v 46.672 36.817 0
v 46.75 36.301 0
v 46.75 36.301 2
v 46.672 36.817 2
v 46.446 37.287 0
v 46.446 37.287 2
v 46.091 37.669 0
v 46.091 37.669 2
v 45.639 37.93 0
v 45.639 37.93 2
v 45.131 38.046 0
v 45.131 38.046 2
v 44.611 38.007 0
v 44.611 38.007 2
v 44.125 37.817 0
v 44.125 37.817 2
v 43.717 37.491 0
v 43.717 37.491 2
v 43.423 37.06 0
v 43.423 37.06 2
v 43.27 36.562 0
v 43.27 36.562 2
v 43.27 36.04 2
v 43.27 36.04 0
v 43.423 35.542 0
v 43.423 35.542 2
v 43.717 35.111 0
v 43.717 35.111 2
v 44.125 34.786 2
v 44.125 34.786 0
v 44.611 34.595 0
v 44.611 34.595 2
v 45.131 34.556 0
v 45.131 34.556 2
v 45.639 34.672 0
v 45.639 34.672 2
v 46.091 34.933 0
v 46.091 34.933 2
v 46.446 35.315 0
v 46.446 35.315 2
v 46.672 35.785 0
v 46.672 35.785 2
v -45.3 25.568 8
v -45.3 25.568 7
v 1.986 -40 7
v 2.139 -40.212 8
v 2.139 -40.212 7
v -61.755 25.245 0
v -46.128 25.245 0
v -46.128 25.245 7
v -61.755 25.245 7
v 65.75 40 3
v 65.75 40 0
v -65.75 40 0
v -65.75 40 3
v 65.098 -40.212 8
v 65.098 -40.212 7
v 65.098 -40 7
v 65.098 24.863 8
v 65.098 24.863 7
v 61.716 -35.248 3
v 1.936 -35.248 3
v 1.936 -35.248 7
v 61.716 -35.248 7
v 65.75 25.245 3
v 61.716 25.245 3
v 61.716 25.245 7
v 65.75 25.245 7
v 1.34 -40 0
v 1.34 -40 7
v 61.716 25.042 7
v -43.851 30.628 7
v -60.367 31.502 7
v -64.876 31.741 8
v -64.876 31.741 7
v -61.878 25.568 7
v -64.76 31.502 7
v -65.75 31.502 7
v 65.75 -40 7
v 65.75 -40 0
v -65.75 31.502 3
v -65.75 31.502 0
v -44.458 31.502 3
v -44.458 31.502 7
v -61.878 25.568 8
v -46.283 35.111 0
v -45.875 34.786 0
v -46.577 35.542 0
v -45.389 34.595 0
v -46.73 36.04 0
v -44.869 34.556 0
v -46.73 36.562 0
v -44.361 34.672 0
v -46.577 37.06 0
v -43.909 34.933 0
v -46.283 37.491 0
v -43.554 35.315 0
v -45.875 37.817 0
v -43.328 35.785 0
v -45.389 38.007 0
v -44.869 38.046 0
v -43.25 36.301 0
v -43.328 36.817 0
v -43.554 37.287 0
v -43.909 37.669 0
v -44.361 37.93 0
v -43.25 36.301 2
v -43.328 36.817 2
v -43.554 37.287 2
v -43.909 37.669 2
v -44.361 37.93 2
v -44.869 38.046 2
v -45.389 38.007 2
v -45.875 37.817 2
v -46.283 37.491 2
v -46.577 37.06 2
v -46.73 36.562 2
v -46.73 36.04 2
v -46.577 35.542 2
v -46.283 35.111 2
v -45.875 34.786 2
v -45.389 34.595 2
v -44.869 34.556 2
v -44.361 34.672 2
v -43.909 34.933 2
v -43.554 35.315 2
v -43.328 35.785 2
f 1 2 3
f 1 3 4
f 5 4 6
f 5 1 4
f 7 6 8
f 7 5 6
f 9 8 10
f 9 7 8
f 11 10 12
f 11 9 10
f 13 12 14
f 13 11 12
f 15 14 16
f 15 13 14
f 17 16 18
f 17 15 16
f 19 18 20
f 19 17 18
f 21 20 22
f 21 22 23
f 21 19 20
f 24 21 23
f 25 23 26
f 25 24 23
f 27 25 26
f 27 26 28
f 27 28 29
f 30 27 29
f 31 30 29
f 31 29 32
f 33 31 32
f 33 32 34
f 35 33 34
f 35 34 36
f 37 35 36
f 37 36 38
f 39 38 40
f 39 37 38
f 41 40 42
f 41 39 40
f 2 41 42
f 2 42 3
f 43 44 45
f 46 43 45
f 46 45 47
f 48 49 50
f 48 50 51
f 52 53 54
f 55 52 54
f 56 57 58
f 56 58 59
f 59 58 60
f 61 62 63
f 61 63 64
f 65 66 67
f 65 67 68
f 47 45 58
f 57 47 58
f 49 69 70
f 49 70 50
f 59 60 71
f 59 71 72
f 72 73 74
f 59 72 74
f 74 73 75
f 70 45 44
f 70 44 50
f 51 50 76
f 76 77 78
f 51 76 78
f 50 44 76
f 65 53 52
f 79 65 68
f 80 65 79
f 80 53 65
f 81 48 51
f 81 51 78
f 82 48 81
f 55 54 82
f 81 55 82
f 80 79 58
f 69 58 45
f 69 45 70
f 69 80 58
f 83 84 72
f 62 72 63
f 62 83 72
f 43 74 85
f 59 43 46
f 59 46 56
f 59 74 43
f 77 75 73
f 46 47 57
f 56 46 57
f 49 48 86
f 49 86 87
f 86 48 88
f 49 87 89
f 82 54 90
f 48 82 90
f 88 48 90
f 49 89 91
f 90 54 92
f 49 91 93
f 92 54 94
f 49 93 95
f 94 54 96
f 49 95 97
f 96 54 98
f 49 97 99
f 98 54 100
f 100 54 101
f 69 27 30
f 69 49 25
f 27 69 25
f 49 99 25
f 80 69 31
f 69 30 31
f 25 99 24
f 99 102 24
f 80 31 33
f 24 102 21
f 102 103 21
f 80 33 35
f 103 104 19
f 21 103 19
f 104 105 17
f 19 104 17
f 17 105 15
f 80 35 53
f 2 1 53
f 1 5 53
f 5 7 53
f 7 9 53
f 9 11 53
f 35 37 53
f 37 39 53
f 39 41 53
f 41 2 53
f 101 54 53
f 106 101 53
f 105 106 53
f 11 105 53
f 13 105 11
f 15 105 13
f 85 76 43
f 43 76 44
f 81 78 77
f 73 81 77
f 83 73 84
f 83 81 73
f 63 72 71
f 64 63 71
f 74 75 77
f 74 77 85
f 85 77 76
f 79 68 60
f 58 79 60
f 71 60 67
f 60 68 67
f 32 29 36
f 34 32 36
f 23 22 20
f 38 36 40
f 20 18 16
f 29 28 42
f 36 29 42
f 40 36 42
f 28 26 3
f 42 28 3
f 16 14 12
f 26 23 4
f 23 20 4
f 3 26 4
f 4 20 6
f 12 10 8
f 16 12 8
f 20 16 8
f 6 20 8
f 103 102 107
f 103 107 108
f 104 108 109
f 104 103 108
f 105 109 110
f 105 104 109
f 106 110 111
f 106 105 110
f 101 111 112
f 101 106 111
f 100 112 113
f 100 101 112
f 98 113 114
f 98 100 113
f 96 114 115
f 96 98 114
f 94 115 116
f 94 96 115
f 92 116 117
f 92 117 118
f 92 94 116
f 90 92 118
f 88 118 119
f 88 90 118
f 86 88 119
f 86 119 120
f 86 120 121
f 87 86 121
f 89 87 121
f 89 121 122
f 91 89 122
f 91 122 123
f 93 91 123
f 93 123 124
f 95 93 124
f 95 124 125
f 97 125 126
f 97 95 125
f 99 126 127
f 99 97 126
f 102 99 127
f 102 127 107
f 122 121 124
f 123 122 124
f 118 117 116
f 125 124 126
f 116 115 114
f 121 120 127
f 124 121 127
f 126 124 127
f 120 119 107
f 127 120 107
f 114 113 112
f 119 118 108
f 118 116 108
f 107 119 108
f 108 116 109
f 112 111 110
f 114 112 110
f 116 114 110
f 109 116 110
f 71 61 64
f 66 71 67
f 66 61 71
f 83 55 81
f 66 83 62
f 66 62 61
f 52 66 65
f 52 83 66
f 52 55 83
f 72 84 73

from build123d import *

# Parameters (mm, degrees)
PAD_DEPTH    = 3
SKETCH_R     = 1.75
POCKET_DEPTH = 2
PAD001_DEPTH = 4
PAD002_DEPTH = 1


with BuildPart() as part:
    # Sketch010 → Pad (new body)
    with BuildSketch(Plane.XY):
        Polygon((-46.128487, 25.244961), (1.34, -40), (65.75, -40), (65.75, 40), (-65.75, 40), (-65.75, 31.502308), (-61.754631, 25.244961), align=None)
    extrude(amount=PAD_DEPTH)

    # Sketch → Pocket (cut)
    with BuildSketch(Plane.XY):
        with Locations((-45, 36.301168)):
            Circle(SKETCH_R)
        with Locations((45, 36.301168)):
            Circle(SKETCH_R)
    extrude(amount=POCKET_DEPTH, mode=Mode.SUBTRACT)

    # Sketch011 (on Face5 of Pocket) → Pad001 (join)
    with BuildSketch(Plane.XY.offset(3)):
        Polygon((65.75, 25.244961), (65.75, -40), (1.34, -40), (-46.128487, 25.244961), (-61.754631, 25.244961), (-65.75, 31.502308), (-44.458256, 31.502308), (1.935629, -35.248356), (61.715927, -35.248356), (61.715927, 25.244961), align=None)
    extrude(amount=PAD001_DEPTH)

    # Sketch012 (on Face14 of Pad001) → Pad002 (join)
    with BuildSketch(Plane.XY.offset(7)):
        Polygon((-64.875565, 31.740883), (-61.877544, 25.56848), (-45.300247, 25.56848), (2.139057, -40.211658), (65.097519, -40.211658), (65.097519, 24.863066), align=None)
    extrude(amount=PAD002_DEPTH)


solid = part.part
